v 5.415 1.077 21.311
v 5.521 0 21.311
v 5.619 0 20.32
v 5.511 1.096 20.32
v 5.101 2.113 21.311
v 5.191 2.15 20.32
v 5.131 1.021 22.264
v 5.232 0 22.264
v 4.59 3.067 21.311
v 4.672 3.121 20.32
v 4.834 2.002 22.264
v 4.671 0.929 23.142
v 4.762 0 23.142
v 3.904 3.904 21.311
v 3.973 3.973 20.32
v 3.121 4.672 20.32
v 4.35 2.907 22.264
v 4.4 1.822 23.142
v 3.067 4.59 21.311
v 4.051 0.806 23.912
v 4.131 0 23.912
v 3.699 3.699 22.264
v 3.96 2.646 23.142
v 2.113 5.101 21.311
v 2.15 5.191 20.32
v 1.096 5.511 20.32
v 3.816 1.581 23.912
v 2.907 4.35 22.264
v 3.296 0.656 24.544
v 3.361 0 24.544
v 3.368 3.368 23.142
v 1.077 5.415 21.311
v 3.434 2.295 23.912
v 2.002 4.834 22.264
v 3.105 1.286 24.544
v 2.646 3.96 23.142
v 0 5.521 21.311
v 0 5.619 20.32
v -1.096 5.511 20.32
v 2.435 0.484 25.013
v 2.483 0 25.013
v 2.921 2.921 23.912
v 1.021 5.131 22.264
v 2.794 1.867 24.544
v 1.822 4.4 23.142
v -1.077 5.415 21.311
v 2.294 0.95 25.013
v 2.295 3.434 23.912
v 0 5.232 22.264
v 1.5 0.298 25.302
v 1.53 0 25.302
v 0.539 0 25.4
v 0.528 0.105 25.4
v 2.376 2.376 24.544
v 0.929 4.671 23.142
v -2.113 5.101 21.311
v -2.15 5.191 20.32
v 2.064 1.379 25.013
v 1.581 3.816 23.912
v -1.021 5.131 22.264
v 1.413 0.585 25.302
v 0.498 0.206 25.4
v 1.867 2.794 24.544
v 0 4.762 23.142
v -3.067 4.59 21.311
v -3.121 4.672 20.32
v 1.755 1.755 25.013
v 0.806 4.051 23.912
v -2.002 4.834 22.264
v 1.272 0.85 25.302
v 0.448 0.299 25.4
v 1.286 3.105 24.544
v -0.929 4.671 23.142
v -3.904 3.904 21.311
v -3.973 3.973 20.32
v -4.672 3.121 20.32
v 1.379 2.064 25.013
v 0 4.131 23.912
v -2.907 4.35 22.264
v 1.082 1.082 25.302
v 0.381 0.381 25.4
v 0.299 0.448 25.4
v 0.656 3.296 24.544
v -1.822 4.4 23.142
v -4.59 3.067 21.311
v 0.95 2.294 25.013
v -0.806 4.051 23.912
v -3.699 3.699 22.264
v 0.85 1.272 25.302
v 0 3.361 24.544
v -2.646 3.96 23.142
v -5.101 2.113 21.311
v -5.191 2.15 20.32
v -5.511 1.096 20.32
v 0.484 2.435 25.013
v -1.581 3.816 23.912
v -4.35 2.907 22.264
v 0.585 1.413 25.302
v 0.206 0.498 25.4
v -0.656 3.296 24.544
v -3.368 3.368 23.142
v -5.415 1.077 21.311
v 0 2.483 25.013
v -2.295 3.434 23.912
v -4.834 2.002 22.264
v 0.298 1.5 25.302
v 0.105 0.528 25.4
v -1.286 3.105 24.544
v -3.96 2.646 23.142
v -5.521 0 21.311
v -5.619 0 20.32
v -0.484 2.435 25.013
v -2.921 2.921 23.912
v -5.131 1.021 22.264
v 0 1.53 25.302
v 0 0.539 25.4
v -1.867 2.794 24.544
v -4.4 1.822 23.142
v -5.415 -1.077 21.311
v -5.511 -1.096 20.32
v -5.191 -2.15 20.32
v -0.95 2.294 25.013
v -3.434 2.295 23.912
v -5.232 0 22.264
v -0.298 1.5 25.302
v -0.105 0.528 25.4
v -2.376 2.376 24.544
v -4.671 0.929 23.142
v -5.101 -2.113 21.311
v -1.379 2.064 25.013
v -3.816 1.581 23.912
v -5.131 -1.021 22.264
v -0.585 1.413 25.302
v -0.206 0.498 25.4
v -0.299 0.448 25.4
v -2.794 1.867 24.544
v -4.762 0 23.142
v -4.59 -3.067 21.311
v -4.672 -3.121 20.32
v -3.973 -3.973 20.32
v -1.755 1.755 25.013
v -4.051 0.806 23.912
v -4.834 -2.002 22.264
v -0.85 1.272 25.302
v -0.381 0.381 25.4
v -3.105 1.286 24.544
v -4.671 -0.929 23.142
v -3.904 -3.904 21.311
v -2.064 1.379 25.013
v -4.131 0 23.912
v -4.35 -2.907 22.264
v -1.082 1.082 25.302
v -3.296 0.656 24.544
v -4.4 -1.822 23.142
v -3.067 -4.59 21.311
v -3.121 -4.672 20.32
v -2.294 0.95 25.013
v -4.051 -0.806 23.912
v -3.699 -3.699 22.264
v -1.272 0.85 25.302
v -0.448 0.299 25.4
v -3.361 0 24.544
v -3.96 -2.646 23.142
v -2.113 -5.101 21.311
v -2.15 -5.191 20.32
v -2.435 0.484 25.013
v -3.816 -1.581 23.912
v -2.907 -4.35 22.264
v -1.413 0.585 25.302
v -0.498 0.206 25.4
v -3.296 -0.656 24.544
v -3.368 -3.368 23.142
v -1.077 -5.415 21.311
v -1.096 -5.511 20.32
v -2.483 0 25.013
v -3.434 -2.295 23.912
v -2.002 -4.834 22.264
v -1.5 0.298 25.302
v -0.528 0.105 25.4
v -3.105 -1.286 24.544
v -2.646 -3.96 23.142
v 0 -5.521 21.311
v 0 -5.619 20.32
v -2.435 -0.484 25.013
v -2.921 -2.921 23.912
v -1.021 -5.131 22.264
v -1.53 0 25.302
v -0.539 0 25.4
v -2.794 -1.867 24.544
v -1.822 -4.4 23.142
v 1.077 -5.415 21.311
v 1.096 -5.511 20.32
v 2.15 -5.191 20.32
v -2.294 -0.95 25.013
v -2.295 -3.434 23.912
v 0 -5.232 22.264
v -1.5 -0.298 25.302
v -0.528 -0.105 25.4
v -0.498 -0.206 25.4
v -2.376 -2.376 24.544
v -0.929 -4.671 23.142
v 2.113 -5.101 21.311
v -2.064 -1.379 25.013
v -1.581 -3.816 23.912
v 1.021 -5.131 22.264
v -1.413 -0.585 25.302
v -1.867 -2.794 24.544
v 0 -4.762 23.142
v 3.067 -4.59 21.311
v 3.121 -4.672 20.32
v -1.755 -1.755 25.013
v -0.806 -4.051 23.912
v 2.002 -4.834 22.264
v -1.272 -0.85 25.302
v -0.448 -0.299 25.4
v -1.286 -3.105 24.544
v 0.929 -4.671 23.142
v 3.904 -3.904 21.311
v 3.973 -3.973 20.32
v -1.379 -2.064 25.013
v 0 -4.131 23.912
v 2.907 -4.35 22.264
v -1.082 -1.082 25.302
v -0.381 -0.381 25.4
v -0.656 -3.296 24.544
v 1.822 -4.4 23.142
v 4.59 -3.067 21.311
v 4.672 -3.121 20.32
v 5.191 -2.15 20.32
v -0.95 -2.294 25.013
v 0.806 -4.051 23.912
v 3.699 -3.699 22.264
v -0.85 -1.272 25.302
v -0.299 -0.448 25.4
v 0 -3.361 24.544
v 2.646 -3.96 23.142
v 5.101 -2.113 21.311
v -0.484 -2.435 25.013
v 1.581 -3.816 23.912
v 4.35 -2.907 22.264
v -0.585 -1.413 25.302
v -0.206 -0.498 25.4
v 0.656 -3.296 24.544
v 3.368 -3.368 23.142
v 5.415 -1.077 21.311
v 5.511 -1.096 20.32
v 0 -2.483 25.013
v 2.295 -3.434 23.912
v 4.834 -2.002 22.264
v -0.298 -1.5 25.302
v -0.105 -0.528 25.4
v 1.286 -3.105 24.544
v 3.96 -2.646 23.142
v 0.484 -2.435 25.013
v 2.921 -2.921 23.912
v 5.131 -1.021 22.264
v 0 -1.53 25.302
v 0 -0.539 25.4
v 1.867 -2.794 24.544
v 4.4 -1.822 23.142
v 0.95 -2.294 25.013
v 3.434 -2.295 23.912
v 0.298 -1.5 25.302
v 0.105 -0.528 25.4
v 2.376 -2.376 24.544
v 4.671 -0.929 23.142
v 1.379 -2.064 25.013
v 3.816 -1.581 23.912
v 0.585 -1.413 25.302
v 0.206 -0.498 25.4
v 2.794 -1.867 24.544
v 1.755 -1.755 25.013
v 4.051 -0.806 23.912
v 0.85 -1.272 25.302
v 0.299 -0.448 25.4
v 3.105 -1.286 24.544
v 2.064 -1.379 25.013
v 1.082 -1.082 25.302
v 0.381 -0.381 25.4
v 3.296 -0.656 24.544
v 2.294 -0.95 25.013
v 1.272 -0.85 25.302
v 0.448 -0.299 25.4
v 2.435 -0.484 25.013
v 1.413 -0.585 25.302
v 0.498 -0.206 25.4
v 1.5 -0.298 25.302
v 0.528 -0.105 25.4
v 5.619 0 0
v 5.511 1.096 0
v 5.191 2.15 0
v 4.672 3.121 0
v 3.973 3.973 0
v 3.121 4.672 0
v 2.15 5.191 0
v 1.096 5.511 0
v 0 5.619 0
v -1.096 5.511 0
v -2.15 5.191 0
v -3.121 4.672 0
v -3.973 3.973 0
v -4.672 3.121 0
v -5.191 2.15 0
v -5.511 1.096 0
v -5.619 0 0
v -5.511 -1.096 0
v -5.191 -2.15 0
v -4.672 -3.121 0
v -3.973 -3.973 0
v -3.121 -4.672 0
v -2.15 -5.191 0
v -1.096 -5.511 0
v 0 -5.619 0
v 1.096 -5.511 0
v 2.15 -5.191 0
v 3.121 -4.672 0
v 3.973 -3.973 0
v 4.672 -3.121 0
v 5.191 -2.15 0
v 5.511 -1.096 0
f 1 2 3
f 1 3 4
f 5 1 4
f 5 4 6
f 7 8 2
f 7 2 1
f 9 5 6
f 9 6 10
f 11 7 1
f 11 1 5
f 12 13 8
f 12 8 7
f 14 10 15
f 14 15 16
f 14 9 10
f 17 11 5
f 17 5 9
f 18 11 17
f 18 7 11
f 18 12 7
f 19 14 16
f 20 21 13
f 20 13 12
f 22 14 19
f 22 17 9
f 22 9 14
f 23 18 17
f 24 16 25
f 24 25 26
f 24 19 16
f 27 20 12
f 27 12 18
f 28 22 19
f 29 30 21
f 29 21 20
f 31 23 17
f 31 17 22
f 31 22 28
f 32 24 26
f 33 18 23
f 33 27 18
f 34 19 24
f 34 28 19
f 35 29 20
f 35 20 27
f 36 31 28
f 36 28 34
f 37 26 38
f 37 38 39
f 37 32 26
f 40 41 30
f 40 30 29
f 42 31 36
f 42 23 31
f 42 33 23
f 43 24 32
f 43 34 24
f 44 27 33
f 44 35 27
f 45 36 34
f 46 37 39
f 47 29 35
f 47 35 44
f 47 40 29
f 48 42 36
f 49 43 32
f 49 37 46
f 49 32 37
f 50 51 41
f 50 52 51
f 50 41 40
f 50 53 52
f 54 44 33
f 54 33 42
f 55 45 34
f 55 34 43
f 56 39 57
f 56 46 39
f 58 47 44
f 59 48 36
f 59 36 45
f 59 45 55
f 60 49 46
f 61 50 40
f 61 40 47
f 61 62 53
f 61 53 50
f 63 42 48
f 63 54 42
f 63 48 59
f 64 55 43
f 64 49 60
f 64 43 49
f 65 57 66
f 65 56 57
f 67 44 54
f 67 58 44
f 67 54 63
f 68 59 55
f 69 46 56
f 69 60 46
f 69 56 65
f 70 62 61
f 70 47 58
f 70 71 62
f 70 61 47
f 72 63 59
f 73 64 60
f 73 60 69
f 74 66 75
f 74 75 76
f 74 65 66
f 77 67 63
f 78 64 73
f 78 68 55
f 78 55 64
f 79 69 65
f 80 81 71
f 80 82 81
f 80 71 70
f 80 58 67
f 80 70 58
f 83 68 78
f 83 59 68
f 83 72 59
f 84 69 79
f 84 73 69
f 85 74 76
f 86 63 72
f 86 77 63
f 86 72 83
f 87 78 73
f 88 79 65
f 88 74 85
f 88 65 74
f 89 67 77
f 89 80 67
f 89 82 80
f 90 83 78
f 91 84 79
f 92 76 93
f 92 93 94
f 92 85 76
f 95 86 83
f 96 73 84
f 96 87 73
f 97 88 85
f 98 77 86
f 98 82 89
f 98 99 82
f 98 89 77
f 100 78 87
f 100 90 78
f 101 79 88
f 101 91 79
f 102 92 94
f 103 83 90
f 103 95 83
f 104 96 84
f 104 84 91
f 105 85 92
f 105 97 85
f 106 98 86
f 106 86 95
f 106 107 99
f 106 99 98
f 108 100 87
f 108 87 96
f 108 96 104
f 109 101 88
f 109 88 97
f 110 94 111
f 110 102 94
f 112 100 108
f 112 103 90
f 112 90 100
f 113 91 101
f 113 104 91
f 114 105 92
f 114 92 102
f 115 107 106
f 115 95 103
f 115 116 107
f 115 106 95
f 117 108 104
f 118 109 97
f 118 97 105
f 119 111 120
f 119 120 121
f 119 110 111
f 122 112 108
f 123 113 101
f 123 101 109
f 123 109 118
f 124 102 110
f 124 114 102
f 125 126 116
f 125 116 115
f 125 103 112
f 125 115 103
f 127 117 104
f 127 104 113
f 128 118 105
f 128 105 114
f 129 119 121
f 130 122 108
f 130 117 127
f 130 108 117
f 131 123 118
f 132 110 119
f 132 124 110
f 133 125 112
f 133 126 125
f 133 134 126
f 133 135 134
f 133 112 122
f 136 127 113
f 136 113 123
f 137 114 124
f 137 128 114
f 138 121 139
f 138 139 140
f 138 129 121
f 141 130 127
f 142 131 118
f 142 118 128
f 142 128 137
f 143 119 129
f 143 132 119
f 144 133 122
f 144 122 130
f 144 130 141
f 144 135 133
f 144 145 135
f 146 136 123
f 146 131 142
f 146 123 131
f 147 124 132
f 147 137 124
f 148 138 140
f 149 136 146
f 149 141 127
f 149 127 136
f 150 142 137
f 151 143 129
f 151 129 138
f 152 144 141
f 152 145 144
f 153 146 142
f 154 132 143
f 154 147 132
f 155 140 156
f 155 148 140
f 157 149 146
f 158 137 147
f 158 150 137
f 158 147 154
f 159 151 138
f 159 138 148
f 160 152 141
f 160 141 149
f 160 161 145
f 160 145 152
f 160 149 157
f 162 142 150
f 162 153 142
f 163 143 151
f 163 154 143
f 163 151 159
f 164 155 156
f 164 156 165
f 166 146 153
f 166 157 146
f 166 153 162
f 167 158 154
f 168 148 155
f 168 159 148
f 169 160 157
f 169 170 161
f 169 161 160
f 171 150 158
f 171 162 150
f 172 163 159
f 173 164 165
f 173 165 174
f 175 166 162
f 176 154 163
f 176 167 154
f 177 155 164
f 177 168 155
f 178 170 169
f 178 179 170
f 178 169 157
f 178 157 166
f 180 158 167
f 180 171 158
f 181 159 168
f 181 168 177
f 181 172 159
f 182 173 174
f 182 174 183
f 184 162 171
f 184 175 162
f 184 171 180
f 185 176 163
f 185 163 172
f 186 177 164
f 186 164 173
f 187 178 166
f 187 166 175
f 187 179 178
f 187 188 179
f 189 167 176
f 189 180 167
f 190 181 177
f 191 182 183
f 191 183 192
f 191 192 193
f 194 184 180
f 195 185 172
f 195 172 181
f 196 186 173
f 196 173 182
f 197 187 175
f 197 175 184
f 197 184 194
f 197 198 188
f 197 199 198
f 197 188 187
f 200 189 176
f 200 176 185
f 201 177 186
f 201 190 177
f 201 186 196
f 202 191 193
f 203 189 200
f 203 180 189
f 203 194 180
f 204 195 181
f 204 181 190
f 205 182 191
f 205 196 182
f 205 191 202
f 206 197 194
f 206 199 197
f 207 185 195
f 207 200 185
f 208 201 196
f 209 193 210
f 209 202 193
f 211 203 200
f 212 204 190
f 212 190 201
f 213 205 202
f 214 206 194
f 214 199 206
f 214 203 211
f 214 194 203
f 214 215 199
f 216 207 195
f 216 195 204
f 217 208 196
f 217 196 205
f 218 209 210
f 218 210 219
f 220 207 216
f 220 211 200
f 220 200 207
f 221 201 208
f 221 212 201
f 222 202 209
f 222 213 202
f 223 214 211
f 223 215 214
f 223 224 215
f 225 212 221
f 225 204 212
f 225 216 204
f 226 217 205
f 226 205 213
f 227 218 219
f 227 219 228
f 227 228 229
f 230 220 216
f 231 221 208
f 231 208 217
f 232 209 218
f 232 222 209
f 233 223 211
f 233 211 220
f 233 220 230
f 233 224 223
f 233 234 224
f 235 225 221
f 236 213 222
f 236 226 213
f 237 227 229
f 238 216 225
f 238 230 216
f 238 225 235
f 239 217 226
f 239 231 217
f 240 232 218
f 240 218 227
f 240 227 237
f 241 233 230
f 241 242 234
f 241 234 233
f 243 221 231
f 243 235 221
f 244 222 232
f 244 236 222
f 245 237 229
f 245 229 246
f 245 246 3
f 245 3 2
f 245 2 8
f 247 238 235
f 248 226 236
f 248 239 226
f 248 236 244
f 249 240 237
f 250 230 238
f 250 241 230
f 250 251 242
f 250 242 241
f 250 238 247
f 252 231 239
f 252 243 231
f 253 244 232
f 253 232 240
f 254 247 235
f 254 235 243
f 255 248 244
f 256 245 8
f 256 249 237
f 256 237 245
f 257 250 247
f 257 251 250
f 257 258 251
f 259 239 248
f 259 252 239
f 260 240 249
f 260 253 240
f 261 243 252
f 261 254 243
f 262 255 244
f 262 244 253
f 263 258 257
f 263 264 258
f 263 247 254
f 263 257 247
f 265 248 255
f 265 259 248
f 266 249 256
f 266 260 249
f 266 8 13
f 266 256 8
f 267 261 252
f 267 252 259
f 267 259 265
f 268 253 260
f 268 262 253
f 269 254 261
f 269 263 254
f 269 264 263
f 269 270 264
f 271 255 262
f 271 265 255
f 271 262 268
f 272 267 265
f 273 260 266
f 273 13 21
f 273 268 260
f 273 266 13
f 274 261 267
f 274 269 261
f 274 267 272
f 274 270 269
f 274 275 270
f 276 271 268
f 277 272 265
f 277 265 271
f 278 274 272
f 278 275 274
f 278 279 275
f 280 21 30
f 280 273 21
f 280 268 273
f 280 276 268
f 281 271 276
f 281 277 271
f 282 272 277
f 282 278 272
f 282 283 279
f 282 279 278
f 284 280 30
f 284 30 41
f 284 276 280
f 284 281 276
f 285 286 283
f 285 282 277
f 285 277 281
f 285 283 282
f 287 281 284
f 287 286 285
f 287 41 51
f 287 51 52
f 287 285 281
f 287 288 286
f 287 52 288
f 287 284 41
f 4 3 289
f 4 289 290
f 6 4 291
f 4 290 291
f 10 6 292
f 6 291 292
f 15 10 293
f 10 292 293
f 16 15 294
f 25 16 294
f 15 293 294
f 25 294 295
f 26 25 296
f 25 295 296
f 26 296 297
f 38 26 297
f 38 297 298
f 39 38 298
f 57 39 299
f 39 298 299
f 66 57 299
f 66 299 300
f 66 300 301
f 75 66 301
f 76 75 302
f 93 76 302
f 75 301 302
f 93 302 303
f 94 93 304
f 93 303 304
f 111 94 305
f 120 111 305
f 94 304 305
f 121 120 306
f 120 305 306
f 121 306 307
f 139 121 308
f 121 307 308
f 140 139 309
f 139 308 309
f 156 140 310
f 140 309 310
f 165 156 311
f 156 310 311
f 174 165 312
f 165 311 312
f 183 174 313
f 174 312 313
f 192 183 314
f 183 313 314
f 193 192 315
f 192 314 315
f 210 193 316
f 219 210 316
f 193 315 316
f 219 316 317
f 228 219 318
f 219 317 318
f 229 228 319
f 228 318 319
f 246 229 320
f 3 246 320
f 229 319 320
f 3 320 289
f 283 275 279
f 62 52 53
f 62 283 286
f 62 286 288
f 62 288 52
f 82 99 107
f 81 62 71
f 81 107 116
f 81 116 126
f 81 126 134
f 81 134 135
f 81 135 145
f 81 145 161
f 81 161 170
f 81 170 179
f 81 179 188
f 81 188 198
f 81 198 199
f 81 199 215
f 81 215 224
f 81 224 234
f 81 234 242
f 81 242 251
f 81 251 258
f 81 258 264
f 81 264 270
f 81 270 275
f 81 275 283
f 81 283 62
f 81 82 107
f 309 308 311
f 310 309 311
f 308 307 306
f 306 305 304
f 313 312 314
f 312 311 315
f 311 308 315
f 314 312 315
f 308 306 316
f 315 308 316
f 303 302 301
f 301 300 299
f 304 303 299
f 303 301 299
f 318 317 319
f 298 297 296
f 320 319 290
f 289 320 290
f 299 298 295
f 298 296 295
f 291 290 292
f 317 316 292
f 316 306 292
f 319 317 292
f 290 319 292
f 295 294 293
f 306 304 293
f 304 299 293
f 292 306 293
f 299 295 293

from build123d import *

# Parameters (mm, degrees)
F0_R     = 5.618526
F1_DEPTH = 25.4
F2_R     = 5.08
F3_R     = 3.81
F4_DEPTH = 3


with BuildPart() as f1:
    # F0 (on Top) → F1 (new body)
    with BuildSketch(Plane.XY):
        Circle(F0_R)
    extrude(amount=F1_DEPTH)

    # F2
    f2_edges = [f1.edges().sort_by_distance(p)[0] for p in [
        (-5.618526, 0, 25.4),
    ]]
    fillet(f2_edges, radius=F2_R)

    # F3 (on Top) → F4 (join)
    with BuildSketch(Plane.XY):
        Circle(F3_R)
    extrude(amount=F4_DEPTH)


solid = f1.part
